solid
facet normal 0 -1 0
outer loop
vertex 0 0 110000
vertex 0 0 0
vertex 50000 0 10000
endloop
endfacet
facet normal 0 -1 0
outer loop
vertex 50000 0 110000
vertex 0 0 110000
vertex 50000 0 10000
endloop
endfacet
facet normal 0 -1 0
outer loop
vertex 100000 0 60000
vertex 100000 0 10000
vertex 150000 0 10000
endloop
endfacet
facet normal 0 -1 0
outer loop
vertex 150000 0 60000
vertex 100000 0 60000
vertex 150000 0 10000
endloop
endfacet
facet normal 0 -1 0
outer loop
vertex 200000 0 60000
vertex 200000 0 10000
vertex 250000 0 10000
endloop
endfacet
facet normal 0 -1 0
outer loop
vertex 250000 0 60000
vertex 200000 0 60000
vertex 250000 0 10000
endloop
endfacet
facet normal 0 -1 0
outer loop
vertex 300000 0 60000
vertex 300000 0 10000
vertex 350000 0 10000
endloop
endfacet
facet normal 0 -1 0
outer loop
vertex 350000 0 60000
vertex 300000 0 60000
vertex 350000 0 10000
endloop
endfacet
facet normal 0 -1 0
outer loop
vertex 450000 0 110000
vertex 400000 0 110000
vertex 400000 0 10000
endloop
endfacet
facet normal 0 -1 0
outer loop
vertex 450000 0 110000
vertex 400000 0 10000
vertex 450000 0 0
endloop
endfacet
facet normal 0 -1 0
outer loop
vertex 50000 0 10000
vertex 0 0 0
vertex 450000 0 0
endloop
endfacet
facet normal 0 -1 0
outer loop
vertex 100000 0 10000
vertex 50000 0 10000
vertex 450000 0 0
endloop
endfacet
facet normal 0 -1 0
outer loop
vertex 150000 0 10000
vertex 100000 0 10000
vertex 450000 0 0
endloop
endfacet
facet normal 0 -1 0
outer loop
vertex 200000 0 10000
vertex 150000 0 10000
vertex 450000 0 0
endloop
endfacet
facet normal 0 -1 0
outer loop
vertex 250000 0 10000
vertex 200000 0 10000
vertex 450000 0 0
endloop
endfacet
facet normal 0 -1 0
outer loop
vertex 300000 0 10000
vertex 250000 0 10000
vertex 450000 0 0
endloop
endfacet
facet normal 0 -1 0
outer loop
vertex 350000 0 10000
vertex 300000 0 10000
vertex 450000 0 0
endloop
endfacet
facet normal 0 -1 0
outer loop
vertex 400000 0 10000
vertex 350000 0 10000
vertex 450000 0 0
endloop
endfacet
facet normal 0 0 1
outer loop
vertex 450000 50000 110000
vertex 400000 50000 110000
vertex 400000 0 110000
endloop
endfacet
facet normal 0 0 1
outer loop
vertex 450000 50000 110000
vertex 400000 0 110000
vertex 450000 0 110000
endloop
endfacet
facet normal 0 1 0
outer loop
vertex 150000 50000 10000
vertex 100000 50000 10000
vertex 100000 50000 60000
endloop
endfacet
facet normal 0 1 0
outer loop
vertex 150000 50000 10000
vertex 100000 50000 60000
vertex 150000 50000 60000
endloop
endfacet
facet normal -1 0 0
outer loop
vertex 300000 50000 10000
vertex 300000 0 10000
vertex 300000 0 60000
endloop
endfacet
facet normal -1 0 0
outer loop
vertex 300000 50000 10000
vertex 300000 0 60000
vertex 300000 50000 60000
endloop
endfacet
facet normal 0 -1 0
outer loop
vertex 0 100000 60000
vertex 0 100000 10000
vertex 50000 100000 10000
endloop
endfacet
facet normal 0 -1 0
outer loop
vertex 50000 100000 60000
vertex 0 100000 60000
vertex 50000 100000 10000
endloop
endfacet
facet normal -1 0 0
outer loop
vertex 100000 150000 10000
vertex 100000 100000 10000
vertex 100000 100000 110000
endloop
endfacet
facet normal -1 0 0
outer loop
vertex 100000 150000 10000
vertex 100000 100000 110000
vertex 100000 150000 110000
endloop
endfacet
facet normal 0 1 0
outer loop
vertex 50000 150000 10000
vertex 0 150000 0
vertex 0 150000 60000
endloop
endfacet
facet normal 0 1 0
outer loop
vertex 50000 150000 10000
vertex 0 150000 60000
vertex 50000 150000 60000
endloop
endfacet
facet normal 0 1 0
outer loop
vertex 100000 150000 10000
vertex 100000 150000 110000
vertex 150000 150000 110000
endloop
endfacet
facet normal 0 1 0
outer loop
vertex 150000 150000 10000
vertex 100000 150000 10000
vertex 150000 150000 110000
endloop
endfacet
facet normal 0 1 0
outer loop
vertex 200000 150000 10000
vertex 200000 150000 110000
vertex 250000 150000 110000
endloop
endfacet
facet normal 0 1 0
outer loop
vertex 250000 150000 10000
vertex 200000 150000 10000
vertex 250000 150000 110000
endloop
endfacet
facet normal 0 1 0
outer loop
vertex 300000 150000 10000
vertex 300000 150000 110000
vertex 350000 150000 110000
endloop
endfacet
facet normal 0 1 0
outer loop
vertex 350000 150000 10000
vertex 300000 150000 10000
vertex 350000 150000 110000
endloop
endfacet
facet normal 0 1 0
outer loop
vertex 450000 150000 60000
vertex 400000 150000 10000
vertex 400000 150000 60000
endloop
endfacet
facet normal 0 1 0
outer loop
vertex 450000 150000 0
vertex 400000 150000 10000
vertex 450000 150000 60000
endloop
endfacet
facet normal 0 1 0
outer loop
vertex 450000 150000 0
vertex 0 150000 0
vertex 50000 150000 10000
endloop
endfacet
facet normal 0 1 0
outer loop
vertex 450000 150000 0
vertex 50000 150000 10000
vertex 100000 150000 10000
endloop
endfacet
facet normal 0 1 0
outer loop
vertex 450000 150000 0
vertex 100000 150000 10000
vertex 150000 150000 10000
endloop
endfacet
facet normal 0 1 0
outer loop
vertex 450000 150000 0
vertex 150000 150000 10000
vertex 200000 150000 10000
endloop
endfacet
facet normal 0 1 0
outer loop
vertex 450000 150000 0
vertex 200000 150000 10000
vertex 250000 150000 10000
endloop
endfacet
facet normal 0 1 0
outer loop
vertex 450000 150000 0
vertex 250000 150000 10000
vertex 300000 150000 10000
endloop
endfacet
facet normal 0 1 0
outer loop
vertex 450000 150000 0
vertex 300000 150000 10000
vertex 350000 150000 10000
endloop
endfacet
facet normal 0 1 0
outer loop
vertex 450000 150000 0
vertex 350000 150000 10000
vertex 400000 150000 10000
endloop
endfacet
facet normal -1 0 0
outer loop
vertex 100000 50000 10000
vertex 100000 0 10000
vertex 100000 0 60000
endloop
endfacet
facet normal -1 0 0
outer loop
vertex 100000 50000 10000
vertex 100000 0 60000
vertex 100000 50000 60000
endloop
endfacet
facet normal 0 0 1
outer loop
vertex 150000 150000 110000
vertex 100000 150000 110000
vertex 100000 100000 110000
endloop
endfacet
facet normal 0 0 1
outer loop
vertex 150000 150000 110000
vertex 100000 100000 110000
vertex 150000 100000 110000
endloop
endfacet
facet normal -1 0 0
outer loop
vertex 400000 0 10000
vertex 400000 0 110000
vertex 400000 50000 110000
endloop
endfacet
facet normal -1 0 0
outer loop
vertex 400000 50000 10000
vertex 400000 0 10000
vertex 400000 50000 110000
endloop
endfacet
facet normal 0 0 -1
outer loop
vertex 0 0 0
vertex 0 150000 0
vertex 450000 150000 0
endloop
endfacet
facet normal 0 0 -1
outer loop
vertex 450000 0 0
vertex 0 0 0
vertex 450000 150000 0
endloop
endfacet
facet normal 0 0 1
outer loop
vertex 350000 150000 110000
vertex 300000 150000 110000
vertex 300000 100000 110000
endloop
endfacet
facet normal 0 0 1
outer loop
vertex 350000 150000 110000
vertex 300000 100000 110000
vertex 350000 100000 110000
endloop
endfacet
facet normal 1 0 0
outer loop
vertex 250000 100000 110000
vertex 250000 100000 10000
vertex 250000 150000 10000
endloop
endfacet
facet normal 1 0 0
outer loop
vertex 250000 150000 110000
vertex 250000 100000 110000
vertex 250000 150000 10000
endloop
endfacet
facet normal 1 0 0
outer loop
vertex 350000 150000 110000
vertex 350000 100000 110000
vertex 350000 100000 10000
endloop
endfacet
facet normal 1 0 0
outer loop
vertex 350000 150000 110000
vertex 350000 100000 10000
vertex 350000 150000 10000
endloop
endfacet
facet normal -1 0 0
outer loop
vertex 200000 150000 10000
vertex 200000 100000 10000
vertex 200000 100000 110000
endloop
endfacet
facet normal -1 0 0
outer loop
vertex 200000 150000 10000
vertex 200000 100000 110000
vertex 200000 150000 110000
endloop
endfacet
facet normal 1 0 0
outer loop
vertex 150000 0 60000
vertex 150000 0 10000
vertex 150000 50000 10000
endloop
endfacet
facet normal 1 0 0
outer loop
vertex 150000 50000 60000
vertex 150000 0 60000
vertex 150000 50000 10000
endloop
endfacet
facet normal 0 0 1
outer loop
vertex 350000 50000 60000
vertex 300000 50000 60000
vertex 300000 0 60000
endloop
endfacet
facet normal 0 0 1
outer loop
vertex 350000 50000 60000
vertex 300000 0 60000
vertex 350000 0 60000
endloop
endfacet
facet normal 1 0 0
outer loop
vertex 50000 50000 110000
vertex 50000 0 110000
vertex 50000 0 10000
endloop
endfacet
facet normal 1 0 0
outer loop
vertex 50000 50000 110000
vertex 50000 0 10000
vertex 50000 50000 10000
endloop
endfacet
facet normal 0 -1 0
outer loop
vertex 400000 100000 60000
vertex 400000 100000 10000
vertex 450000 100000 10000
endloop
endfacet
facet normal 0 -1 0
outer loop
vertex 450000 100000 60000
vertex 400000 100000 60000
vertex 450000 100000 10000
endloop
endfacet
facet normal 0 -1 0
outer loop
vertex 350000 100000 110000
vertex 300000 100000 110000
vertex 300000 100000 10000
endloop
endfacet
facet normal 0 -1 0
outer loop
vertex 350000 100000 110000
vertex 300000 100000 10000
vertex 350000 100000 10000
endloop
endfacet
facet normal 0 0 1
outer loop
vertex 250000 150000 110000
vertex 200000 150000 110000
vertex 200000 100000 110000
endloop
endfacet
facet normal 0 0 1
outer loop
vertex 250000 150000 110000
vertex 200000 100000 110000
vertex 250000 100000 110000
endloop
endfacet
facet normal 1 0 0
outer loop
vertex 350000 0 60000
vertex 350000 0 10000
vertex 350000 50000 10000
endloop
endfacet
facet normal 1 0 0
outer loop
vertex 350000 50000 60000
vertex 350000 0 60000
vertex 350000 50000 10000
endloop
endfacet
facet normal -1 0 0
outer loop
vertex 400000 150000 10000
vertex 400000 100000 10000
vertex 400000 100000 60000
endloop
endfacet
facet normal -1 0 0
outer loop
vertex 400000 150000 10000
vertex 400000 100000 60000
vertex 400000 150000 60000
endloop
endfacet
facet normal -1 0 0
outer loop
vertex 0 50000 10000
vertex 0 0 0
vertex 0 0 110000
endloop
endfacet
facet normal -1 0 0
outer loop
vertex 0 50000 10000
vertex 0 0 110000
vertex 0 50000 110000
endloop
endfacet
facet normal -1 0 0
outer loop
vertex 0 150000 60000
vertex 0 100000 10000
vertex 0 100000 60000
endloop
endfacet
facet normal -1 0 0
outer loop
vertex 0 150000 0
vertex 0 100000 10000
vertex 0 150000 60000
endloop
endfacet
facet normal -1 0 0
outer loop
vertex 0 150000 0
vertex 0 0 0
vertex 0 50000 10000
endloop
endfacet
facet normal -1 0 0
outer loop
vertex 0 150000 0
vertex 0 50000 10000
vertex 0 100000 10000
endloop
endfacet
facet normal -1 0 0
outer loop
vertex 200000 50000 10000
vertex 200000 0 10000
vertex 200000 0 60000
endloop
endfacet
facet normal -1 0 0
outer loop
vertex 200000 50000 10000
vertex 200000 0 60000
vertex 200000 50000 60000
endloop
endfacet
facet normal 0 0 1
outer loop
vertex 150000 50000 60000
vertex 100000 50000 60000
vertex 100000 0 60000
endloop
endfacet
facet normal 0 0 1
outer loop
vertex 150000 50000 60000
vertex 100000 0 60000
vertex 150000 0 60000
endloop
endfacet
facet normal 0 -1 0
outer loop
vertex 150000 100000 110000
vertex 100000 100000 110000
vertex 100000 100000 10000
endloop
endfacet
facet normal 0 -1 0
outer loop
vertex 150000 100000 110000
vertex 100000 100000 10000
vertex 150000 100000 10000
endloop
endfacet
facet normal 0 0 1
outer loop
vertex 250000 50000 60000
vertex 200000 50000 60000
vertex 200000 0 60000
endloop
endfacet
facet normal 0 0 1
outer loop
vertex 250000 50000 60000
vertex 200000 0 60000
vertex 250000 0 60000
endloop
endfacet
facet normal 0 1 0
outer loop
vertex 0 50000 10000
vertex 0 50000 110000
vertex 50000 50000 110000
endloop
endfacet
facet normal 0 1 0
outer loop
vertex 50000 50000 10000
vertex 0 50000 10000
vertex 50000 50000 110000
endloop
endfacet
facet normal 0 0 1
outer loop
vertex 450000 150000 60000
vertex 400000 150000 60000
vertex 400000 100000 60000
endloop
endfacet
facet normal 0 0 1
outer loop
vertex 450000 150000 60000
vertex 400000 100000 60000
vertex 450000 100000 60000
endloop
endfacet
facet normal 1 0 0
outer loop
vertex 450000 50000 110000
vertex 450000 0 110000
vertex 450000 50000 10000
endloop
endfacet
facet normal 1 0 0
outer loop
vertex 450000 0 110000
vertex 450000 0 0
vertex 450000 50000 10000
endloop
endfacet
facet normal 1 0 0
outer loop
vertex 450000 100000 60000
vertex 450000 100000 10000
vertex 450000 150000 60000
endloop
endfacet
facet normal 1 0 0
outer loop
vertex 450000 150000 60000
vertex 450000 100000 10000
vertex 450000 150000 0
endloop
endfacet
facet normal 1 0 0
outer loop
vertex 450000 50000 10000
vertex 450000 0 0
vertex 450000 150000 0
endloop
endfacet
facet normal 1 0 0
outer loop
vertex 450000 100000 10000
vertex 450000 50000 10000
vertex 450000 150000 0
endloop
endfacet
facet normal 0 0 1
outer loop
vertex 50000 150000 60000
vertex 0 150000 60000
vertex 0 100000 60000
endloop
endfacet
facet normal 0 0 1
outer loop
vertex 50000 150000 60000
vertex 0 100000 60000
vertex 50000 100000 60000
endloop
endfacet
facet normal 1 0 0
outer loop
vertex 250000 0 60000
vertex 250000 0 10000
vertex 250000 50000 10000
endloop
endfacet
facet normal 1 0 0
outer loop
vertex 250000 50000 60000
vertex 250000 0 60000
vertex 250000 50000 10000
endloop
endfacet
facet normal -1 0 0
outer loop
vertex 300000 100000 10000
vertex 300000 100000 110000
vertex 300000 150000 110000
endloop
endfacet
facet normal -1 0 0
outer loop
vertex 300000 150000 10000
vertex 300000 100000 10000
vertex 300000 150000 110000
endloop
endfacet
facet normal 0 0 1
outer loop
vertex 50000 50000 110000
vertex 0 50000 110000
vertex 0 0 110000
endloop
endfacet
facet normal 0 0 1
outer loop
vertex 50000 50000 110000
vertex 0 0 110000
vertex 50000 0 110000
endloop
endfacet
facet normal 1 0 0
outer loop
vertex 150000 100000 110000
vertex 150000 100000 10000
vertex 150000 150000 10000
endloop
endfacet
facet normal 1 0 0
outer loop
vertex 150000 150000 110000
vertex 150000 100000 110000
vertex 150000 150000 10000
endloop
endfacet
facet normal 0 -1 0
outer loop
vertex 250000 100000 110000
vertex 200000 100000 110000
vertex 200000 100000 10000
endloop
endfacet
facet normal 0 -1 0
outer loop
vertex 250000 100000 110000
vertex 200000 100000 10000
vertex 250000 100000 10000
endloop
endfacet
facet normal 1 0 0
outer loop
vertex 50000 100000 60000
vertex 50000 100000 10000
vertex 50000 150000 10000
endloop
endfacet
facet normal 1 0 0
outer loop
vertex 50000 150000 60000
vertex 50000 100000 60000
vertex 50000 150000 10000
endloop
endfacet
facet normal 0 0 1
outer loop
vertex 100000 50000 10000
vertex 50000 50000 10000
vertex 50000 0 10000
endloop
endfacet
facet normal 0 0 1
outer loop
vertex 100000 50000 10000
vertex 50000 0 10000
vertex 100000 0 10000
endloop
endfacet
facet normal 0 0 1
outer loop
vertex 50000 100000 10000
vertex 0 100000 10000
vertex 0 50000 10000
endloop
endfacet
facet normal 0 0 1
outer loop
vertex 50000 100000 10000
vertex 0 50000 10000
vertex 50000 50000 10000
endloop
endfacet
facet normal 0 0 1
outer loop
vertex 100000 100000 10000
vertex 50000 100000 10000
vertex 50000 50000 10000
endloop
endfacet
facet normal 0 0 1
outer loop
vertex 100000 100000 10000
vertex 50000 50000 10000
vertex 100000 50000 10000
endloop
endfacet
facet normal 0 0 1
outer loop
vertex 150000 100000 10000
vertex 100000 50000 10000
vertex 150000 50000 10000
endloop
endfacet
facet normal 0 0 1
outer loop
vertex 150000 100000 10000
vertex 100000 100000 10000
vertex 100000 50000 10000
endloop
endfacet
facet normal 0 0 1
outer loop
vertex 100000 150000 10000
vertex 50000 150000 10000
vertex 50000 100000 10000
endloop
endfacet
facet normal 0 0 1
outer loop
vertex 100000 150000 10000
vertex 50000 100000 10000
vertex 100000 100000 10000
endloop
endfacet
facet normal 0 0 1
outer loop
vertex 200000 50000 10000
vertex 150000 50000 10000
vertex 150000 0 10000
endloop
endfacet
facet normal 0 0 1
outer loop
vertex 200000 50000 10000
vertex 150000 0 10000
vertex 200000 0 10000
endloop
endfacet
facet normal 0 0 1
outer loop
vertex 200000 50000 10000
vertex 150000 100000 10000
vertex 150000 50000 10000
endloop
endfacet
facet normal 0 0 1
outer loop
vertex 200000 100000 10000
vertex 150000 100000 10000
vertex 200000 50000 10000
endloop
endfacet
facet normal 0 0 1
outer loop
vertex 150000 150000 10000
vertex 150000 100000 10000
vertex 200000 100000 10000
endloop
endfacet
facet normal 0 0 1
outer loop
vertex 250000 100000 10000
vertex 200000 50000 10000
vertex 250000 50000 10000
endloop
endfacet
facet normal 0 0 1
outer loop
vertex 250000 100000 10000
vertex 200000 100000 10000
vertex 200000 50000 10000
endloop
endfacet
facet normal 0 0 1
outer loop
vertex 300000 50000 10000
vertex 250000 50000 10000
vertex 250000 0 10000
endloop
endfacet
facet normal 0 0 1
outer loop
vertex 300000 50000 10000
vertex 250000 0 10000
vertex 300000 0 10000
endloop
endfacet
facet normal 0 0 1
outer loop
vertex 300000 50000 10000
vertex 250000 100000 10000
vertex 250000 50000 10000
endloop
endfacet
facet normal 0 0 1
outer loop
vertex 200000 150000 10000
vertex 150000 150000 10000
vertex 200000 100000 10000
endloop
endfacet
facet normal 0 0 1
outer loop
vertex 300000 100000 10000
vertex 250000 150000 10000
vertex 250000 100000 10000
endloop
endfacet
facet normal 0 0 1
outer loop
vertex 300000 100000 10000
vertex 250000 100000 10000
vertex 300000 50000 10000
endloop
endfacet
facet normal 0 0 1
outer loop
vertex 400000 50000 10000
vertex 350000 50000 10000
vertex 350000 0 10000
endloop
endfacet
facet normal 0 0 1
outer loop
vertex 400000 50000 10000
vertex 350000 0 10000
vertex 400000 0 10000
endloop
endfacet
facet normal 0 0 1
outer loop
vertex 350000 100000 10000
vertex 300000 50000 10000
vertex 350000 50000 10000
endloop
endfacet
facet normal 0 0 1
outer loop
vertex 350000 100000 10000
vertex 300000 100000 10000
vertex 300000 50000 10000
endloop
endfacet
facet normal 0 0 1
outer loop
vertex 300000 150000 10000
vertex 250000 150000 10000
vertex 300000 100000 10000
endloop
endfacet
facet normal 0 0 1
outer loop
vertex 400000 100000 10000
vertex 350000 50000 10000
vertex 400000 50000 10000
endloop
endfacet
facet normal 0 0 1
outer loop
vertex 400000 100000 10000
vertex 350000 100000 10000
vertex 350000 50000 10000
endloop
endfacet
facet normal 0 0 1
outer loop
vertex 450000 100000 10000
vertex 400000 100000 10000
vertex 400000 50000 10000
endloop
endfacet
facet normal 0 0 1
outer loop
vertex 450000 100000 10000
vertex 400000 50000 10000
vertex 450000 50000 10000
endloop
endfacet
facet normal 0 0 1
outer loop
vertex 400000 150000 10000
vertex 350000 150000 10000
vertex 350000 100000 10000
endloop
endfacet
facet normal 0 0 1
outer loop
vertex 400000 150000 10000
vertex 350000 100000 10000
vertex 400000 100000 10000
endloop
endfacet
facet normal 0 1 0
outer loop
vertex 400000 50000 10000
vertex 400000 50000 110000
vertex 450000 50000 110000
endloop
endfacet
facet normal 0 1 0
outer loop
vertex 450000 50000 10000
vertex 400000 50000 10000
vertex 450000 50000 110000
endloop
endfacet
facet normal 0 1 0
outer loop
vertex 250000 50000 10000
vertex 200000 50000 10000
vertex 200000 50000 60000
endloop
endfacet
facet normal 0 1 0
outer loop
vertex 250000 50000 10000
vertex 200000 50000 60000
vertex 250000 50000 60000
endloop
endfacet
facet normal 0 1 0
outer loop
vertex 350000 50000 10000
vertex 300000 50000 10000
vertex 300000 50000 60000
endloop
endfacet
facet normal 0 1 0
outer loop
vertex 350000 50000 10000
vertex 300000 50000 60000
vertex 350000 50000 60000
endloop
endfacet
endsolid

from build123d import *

# Parameters (mm, degrees)
SKETCH2_W           = 450000
SKETCH2_H           = 150000
BOSS_EXTRUDE2_DEPTH = 10000
SKETCH4_W           = 50000
SKETCH4_H           = 50000
BOSS_EXTRUDE5_DEPTH = 100000
SKETCH5_W           = 50000
SKETCH5_H           = 50000
BOSS_EXTRUDE6_DEPTH = 50000


with BuildPart() as part:
    # Sketch2 → Boss-Extrude2 (new body)
    with BuildSketch(Plane.XY):
        with Locations((225000, 75000)):
            Rectangle(SKETCH2_W, SKETCH2_H)
    extrude(amount=BOSS_EXTRUDE2_DEPTH)

    # Sketch4 → Boss-Extrude5 (add)
    with BuildSketch(Plane.XY.offset(10000)):
        with Locations((225000, 124999.999999999)):
            Rectangle(SKETCH4_W, SKETCH4_H)
        with Locations((325000, 125000)):
            Rectangle(SKETCH4_W, SKETCH4_H)
        with Locations((425000, 25000)):
            Rectangle(SKETCH4_W, SKETCH4_H)
        with Locations((25000, 25000)):
            Rectangle(SKETCH4_W, SKETCH4_H)
        with Locations((125000, 124999.999999999)):
            Rectangle(SKETCH4_W, SKETCH4_H)
    extrude(amount=BOSS_EXTRUDE5_DEPTH)

    # Sketch5 → Boss-Extrude6 (add)
    with BuildSketch(Plane.XY.offset(10000)):
        with Locations((325000, 25000)):
            Rectangle(SKETCH5_W, SKETCH5_H)
        with Locations((225000, 25000)):
            Rectangle(SKETCH5_W, SKETCH5_H)
        with Locations((125000, 25000)):
            Rectangle(SKETCH5_W, SKETCH5_H)
        with Locations((25000, 125000)):
            Rectangle(SKETCH5_W, SKETCH5_H)
        with Locations((425000, 125000)):
            Rectangle(SKETCH5_W, SKETCH5_H)
    extrude(amount=BOSS_EXTRUDE6_DEPTH)


solid = part.part
